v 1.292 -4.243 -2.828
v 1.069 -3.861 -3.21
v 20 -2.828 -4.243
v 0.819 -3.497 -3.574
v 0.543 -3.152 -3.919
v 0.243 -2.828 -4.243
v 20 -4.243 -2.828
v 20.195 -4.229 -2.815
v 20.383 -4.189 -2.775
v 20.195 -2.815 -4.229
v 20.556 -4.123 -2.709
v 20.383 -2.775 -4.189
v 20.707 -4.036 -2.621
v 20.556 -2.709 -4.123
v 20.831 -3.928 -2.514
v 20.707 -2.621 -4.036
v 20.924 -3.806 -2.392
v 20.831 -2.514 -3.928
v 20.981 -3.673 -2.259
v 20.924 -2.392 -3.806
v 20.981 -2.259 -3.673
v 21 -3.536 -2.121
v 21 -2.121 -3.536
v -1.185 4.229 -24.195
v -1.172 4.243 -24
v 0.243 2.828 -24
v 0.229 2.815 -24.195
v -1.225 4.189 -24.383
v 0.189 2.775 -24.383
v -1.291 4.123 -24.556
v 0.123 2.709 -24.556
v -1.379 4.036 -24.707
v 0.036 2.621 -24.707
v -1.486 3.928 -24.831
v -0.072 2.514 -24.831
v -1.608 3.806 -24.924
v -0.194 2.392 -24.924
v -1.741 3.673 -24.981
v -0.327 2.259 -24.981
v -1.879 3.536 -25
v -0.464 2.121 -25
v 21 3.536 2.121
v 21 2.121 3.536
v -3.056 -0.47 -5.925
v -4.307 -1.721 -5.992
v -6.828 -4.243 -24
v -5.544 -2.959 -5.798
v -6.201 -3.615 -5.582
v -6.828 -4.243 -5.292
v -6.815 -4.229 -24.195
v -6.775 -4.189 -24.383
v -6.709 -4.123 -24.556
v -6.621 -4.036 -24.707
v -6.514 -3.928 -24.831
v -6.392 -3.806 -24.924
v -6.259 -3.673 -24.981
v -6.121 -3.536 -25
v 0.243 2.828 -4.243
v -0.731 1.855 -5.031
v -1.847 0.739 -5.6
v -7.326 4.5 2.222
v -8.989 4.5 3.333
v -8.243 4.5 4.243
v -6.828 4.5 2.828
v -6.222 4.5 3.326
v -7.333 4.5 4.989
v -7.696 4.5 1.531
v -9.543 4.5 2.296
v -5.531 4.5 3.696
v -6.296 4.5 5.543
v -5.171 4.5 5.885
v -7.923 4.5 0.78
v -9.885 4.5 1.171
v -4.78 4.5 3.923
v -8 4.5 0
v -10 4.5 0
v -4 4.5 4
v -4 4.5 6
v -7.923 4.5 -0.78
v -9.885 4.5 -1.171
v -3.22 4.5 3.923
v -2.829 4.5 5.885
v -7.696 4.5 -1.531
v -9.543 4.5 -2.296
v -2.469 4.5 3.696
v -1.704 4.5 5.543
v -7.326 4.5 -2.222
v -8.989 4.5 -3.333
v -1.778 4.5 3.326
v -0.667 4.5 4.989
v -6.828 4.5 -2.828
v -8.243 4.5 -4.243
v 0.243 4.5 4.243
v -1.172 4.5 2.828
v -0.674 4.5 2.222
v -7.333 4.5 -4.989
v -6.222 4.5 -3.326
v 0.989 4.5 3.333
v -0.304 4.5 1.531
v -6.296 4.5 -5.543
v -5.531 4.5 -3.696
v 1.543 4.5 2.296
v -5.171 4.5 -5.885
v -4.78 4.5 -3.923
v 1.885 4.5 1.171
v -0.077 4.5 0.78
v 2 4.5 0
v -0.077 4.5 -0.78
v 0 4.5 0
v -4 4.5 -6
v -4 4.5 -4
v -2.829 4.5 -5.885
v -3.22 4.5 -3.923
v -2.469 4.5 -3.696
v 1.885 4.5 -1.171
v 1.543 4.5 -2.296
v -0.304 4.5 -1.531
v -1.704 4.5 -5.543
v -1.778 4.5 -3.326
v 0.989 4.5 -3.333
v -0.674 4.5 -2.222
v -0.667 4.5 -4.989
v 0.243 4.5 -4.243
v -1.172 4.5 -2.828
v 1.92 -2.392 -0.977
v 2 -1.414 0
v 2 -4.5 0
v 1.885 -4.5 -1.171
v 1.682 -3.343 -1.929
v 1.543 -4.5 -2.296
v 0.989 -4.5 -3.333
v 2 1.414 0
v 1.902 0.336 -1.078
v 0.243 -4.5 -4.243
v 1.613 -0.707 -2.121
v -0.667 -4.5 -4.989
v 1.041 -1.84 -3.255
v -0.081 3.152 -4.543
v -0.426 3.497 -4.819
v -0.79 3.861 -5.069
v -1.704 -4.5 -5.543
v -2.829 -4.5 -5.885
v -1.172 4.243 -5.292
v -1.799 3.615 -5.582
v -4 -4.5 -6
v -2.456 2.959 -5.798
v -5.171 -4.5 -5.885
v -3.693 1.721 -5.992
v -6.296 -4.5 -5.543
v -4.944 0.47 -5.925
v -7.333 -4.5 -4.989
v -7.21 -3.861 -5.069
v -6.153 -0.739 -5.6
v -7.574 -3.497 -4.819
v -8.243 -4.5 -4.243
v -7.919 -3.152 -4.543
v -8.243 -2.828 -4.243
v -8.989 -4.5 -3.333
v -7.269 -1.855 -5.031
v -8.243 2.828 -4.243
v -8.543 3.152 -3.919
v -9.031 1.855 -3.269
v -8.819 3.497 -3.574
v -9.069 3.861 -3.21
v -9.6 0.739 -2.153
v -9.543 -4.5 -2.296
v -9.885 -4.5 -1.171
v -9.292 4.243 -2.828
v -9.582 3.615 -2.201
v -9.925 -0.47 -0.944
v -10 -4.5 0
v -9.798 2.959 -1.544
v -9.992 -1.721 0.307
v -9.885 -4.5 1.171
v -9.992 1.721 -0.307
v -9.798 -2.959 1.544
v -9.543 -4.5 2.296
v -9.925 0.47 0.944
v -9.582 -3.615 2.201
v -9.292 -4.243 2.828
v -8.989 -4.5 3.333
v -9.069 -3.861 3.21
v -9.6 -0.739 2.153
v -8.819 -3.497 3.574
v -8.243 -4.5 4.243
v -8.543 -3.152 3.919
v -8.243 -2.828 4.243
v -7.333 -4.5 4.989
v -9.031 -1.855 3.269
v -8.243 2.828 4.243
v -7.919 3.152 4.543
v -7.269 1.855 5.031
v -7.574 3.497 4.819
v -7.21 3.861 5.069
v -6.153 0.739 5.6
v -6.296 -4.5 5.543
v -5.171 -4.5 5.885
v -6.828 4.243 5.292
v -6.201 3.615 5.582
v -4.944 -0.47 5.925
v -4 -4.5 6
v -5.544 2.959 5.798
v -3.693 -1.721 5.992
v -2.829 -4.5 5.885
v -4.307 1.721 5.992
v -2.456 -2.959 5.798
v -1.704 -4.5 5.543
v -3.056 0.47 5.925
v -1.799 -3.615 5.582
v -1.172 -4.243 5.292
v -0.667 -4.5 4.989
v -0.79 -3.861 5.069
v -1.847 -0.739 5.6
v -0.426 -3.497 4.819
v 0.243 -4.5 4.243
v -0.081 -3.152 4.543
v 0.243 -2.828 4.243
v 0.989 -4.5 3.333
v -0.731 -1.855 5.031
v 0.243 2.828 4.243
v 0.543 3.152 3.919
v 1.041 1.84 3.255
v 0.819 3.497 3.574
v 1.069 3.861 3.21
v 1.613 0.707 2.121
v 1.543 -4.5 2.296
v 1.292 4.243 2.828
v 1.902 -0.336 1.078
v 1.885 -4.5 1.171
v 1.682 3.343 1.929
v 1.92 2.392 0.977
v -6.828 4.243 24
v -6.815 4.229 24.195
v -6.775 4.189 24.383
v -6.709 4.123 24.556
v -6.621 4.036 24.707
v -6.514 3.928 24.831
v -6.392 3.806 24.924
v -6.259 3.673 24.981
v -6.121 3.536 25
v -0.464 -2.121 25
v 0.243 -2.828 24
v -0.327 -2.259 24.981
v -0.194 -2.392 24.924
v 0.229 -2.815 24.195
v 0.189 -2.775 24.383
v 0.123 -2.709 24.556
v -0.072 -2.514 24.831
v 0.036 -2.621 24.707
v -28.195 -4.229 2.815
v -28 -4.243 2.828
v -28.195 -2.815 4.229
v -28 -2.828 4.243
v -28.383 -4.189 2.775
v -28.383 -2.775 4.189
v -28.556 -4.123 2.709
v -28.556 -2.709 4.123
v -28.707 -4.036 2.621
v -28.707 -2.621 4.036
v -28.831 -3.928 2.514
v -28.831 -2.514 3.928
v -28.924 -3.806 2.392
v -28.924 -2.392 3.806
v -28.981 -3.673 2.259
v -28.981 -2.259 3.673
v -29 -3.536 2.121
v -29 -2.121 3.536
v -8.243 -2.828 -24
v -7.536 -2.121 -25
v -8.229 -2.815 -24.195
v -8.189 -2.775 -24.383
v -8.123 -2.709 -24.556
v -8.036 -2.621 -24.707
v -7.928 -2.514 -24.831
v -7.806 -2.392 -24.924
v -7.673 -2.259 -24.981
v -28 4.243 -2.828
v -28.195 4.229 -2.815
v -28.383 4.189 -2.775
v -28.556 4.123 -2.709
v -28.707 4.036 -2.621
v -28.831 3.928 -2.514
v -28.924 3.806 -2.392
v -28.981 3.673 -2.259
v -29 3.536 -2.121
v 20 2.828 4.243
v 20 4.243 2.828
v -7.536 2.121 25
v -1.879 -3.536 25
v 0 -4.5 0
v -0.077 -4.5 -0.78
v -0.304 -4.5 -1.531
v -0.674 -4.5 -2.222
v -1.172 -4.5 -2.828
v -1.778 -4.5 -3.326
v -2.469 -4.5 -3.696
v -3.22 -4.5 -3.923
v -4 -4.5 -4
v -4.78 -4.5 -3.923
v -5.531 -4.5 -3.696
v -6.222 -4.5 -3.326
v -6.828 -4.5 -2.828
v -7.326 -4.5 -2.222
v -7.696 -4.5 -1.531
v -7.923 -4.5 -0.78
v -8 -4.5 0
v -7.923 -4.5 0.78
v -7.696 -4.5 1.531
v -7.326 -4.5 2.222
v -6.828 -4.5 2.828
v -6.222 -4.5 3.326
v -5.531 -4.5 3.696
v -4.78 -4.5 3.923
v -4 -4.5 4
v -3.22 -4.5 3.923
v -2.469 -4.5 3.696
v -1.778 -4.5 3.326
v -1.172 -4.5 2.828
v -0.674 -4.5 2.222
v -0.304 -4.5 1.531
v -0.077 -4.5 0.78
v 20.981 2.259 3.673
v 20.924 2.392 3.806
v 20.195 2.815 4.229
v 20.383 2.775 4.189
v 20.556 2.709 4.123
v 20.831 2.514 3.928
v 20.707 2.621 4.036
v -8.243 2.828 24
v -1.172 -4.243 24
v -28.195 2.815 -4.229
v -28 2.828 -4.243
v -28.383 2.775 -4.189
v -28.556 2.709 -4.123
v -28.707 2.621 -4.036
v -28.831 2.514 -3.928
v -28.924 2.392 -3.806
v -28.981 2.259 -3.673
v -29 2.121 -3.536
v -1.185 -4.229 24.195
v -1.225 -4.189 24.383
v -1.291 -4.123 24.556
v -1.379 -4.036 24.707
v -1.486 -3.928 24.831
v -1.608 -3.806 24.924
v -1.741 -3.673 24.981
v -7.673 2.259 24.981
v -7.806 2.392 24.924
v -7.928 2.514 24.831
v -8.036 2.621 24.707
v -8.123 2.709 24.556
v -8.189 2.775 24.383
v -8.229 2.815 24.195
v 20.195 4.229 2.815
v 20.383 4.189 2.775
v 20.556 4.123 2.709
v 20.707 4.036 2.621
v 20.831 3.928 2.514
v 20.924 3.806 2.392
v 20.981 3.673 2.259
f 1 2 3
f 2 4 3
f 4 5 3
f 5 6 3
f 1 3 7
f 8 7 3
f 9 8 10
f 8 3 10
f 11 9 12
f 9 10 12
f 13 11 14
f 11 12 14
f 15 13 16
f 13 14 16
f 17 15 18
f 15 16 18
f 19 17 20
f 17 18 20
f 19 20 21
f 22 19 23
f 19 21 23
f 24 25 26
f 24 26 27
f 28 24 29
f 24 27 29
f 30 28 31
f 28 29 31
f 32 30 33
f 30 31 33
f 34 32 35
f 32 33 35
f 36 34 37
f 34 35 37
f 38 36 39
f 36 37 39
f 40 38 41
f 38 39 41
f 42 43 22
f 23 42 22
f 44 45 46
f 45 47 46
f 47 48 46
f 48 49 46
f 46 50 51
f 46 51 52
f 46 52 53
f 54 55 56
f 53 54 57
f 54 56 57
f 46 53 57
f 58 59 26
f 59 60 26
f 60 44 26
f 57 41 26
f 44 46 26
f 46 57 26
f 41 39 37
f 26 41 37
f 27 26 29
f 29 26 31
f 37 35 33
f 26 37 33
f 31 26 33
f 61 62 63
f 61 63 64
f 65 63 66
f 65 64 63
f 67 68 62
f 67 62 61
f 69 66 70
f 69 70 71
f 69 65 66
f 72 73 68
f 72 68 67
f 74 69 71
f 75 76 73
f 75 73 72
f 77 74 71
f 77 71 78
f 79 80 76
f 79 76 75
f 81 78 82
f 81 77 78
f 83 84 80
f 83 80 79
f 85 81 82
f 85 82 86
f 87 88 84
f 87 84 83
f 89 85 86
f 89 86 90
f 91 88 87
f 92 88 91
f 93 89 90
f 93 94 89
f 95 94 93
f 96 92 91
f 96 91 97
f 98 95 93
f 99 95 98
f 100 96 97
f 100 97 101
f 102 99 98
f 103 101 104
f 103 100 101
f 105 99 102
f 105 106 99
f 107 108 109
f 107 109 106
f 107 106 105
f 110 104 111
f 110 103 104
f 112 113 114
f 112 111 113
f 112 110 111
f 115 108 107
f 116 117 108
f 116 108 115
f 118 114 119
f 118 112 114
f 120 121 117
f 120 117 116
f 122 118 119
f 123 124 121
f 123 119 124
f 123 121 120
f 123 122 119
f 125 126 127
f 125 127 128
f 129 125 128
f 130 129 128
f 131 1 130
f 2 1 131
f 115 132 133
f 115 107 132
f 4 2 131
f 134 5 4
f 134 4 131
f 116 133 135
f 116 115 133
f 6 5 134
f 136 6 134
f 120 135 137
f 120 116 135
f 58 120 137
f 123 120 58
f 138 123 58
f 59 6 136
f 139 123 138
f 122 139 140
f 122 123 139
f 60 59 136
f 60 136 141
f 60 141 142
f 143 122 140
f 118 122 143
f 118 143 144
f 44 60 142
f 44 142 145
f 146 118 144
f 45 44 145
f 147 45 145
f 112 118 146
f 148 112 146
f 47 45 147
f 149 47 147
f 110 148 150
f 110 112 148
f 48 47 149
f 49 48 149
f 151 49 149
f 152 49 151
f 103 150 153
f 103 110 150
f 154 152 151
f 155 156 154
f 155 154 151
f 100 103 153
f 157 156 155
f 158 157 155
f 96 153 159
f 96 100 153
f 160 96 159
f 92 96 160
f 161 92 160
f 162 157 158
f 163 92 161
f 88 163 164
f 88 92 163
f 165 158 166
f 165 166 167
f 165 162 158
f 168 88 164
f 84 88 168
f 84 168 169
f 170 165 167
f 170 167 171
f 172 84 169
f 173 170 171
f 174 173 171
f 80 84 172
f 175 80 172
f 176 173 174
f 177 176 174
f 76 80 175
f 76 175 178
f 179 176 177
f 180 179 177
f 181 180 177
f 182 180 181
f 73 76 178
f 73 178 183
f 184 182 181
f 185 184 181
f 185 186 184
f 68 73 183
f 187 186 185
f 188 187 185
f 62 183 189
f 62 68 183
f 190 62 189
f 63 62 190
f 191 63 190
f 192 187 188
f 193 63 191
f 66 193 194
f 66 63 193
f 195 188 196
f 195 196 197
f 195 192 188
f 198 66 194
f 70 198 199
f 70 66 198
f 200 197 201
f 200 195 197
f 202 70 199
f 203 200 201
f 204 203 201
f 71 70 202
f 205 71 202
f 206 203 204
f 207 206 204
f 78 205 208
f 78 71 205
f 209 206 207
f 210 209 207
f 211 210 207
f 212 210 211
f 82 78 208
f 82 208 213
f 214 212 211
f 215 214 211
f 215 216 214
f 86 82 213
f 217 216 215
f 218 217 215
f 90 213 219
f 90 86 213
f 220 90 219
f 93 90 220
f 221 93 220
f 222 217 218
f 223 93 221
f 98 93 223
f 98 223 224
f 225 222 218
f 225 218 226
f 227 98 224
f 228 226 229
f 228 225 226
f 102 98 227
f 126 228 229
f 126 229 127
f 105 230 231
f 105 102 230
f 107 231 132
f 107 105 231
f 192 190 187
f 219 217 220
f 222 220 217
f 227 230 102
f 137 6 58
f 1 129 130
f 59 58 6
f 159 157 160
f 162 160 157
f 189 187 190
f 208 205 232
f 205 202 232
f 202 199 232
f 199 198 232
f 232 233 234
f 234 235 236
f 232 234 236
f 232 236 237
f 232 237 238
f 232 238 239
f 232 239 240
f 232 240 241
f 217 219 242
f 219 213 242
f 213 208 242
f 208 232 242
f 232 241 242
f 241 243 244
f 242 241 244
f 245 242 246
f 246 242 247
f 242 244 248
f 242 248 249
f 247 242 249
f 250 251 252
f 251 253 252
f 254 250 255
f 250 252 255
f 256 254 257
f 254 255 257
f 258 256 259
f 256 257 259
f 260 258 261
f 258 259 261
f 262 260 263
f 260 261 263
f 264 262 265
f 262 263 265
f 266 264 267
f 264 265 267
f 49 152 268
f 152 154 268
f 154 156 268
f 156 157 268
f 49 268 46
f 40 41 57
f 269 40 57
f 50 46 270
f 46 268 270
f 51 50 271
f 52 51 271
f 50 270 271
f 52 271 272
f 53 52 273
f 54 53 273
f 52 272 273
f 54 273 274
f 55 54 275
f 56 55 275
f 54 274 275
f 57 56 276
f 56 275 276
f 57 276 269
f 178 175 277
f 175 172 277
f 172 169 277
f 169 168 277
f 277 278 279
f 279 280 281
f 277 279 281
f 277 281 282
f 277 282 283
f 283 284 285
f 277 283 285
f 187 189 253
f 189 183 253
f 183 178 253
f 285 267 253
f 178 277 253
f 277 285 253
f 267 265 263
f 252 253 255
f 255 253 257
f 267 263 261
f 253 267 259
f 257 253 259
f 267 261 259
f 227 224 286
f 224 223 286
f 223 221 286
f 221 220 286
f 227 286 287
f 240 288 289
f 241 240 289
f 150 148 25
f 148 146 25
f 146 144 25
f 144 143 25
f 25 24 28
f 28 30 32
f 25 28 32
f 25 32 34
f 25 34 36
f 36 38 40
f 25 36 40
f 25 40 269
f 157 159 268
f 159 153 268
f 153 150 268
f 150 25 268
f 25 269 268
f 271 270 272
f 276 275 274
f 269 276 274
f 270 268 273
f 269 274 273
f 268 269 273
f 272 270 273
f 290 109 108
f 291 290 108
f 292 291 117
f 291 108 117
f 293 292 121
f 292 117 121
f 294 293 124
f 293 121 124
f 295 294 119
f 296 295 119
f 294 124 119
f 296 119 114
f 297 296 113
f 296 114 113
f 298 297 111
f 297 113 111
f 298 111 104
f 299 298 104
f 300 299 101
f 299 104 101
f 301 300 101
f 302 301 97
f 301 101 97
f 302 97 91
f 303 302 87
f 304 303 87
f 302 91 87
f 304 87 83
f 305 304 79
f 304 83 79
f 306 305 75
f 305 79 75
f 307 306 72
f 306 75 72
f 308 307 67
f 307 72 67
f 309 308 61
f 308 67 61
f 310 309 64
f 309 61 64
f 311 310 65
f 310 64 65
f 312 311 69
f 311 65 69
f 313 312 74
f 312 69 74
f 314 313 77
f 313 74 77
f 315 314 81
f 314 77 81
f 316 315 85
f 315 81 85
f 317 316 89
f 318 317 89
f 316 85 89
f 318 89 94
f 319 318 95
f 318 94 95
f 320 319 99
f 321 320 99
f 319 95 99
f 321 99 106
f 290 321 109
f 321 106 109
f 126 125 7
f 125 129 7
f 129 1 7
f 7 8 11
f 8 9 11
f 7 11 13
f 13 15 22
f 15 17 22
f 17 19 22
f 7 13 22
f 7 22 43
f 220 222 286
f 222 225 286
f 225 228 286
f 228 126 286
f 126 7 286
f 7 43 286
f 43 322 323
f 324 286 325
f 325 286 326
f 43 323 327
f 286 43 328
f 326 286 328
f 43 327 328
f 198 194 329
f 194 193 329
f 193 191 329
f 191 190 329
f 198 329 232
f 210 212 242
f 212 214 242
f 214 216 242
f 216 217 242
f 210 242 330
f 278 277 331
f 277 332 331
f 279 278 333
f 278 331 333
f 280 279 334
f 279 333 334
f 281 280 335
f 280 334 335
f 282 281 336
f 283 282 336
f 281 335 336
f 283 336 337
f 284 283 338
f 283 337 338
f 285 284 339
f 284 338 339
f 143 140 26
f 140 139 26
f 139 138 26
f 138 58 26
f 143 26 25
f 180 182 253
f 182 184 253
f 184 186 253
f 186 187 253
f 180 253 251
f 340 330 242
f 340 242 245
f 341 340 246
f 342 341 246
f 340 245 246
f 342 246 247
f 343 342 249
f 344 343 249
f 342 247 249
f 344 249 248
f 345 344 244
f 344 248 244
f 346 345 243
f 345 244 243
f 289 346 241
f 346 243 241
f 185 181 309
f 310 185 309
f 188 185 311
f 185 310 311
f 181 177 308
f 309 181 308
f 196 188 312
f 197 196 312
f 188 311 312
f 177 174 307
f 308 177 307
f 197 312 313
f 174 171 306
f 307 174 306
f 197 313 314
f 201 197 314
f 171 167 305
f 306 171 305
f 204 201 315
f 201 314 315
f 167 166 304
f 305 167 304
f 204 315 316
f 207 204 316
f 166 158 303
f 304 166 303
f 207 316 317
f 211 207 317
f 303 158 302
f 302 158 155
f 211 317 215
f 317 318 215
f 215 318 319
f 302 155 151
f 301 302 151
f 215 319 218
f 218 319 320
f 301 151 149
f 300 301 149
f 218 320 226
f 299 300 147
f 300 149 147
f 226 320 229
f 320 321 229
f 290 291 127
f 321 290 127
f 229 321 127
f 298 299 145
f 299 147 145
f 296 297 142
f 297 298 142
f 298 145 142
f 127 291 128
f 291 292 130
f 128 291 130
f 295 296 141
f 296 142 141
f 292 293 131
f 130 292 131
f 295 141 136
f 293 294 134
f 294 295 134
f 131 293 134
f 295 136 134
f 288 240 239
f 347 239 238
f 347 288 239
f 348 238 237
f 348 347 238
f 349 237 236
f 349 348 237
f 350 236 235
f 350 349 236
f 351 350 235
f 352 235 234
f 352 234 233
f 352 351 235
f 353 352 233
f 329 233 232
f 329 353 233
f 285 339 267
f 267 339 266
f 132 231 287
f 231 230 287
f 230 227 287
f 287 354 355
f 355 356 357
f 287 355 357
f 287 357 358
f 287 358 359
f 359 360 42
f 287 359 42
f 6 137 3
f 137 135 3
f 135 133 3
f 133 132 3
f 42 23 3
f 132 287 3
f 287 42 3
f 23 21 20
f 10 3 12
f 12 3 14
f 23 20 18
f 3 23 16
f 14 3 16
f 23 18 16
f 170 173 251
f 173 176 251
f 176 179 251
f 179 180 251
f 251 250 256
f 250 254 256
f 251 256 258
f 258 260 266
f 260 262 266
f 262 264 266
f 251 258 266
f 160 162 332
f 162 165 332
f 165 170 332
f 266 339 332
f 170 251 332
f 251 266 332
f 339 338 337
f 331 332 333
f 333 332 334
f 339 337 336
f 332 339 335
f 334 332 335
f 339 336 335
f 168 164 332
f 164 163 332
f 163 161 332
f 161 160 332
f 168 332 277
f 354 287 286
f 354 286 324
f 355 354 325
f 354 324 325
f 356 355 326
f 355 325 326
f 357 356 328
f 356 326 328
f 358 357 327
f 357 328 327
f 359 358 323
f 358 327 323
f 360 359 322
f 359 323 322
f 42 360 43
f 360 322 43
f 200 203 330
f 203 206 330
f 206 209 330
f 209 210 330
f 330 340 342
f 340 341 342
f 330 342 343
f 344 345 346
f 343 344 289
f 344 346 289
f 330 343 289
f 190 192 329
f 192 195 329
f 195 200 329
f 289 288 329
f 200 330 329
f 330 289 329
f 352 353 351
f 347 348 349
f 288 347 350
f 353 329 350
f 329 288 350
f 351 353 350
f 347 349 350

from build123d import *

# Parameters (mm, degrees)
CROQUIS3_R              = 6
SALIENTE_EXTRUIR1_DEPTH = 4.5
MATRIZC2_COUNT          = 4
CROQUIS4_R              = 4
CORTAR_EXTRUIR1_DEPTH   = 9
REDONDEO1_R             = 1


with BuildPart() as part:
    # Croquis1 → Recubrir2 section 0
    with BuildSketch(Plane(origin=(0, 0, 0), x_dir=(0, 0, -1), z_dir=(1, 0, 0))):
        Polygon((2.828427125, -4.242640687), (-4.242640687, 2.828427125), (-2.828427125, 4.242640687), (4.242640687, -2.828427125), align=None)
    # Croquis2 → Recubrir2 section 1
    with BuildSketch(Plane(origin=(21, 0, 0), x_dir=(0, 0, -1), z_dir=(1, 0, 0))):
        Polygon((4.242640687, -2.828427125), (-2.828427125, 4.242640687), (-4.242640687, 2.828427125), (2.828427125, -4.242640687), align=None)
    recubrir2 = loft()

    # Croquis3 → Saliente-Extruir1 (add, symmetric)
    with BuildSketch(Plane(origin=(0, 0, 0), x_dir=(1, 0, 0), z_dir=(0, 1, 0))):
        with Locations((-4, 0)):
            Circle(CROQUIS3_R)
    extrude(amount=SALIENTE_EXTRUIR1_DEPTH, both=True)

    # MatrizC2: Recubrir2 ×4 about axis
    matrizc2_axis = Axis((-4, 0, 0), (0, 1, 0))
    for i in range(1, MATRIZC2_COUNT):
        add(recubrir2.rotate(matrizc2_axis, i * 360 / MATRIZC2_COUNT))

    # Croquis4 → Cortar-Extruir1 (cut)
    with BuildSketch(Plane(origin=(0, 4.5, 0), x_dir=(1, 0, 0), z_dir=(0, 1, 0))):
        with Locations((-4, 0)):
            Circle(CROQUIS4_R)
    extrude(amount=-CORTAR_EXTRUIR1_DEPTH, mode=Mode.SUBTRACT)

    # Redondeo1
    redondeo1_edges = [part.edges().sort_by_distance(p)[0] for p in [
        (-7.535533906, 3.535533906, 25),
        (-0.464466094, -3.535533906, 25),
        (-29, -3.535533906, 3.535533906),
        (-29, 3.535533906, -3.535533906),
        (-7.535533906, -3.535533906, -25),
        (-0.464466094, 3.535533906, -25),
        (21, -3.535533906, -3.535533906),
        (21, 3.535533906, 3.535533906),
    ]]
    fillet(redondeo1_edges, radius=REDONDEO1_R)


solid = part.part
